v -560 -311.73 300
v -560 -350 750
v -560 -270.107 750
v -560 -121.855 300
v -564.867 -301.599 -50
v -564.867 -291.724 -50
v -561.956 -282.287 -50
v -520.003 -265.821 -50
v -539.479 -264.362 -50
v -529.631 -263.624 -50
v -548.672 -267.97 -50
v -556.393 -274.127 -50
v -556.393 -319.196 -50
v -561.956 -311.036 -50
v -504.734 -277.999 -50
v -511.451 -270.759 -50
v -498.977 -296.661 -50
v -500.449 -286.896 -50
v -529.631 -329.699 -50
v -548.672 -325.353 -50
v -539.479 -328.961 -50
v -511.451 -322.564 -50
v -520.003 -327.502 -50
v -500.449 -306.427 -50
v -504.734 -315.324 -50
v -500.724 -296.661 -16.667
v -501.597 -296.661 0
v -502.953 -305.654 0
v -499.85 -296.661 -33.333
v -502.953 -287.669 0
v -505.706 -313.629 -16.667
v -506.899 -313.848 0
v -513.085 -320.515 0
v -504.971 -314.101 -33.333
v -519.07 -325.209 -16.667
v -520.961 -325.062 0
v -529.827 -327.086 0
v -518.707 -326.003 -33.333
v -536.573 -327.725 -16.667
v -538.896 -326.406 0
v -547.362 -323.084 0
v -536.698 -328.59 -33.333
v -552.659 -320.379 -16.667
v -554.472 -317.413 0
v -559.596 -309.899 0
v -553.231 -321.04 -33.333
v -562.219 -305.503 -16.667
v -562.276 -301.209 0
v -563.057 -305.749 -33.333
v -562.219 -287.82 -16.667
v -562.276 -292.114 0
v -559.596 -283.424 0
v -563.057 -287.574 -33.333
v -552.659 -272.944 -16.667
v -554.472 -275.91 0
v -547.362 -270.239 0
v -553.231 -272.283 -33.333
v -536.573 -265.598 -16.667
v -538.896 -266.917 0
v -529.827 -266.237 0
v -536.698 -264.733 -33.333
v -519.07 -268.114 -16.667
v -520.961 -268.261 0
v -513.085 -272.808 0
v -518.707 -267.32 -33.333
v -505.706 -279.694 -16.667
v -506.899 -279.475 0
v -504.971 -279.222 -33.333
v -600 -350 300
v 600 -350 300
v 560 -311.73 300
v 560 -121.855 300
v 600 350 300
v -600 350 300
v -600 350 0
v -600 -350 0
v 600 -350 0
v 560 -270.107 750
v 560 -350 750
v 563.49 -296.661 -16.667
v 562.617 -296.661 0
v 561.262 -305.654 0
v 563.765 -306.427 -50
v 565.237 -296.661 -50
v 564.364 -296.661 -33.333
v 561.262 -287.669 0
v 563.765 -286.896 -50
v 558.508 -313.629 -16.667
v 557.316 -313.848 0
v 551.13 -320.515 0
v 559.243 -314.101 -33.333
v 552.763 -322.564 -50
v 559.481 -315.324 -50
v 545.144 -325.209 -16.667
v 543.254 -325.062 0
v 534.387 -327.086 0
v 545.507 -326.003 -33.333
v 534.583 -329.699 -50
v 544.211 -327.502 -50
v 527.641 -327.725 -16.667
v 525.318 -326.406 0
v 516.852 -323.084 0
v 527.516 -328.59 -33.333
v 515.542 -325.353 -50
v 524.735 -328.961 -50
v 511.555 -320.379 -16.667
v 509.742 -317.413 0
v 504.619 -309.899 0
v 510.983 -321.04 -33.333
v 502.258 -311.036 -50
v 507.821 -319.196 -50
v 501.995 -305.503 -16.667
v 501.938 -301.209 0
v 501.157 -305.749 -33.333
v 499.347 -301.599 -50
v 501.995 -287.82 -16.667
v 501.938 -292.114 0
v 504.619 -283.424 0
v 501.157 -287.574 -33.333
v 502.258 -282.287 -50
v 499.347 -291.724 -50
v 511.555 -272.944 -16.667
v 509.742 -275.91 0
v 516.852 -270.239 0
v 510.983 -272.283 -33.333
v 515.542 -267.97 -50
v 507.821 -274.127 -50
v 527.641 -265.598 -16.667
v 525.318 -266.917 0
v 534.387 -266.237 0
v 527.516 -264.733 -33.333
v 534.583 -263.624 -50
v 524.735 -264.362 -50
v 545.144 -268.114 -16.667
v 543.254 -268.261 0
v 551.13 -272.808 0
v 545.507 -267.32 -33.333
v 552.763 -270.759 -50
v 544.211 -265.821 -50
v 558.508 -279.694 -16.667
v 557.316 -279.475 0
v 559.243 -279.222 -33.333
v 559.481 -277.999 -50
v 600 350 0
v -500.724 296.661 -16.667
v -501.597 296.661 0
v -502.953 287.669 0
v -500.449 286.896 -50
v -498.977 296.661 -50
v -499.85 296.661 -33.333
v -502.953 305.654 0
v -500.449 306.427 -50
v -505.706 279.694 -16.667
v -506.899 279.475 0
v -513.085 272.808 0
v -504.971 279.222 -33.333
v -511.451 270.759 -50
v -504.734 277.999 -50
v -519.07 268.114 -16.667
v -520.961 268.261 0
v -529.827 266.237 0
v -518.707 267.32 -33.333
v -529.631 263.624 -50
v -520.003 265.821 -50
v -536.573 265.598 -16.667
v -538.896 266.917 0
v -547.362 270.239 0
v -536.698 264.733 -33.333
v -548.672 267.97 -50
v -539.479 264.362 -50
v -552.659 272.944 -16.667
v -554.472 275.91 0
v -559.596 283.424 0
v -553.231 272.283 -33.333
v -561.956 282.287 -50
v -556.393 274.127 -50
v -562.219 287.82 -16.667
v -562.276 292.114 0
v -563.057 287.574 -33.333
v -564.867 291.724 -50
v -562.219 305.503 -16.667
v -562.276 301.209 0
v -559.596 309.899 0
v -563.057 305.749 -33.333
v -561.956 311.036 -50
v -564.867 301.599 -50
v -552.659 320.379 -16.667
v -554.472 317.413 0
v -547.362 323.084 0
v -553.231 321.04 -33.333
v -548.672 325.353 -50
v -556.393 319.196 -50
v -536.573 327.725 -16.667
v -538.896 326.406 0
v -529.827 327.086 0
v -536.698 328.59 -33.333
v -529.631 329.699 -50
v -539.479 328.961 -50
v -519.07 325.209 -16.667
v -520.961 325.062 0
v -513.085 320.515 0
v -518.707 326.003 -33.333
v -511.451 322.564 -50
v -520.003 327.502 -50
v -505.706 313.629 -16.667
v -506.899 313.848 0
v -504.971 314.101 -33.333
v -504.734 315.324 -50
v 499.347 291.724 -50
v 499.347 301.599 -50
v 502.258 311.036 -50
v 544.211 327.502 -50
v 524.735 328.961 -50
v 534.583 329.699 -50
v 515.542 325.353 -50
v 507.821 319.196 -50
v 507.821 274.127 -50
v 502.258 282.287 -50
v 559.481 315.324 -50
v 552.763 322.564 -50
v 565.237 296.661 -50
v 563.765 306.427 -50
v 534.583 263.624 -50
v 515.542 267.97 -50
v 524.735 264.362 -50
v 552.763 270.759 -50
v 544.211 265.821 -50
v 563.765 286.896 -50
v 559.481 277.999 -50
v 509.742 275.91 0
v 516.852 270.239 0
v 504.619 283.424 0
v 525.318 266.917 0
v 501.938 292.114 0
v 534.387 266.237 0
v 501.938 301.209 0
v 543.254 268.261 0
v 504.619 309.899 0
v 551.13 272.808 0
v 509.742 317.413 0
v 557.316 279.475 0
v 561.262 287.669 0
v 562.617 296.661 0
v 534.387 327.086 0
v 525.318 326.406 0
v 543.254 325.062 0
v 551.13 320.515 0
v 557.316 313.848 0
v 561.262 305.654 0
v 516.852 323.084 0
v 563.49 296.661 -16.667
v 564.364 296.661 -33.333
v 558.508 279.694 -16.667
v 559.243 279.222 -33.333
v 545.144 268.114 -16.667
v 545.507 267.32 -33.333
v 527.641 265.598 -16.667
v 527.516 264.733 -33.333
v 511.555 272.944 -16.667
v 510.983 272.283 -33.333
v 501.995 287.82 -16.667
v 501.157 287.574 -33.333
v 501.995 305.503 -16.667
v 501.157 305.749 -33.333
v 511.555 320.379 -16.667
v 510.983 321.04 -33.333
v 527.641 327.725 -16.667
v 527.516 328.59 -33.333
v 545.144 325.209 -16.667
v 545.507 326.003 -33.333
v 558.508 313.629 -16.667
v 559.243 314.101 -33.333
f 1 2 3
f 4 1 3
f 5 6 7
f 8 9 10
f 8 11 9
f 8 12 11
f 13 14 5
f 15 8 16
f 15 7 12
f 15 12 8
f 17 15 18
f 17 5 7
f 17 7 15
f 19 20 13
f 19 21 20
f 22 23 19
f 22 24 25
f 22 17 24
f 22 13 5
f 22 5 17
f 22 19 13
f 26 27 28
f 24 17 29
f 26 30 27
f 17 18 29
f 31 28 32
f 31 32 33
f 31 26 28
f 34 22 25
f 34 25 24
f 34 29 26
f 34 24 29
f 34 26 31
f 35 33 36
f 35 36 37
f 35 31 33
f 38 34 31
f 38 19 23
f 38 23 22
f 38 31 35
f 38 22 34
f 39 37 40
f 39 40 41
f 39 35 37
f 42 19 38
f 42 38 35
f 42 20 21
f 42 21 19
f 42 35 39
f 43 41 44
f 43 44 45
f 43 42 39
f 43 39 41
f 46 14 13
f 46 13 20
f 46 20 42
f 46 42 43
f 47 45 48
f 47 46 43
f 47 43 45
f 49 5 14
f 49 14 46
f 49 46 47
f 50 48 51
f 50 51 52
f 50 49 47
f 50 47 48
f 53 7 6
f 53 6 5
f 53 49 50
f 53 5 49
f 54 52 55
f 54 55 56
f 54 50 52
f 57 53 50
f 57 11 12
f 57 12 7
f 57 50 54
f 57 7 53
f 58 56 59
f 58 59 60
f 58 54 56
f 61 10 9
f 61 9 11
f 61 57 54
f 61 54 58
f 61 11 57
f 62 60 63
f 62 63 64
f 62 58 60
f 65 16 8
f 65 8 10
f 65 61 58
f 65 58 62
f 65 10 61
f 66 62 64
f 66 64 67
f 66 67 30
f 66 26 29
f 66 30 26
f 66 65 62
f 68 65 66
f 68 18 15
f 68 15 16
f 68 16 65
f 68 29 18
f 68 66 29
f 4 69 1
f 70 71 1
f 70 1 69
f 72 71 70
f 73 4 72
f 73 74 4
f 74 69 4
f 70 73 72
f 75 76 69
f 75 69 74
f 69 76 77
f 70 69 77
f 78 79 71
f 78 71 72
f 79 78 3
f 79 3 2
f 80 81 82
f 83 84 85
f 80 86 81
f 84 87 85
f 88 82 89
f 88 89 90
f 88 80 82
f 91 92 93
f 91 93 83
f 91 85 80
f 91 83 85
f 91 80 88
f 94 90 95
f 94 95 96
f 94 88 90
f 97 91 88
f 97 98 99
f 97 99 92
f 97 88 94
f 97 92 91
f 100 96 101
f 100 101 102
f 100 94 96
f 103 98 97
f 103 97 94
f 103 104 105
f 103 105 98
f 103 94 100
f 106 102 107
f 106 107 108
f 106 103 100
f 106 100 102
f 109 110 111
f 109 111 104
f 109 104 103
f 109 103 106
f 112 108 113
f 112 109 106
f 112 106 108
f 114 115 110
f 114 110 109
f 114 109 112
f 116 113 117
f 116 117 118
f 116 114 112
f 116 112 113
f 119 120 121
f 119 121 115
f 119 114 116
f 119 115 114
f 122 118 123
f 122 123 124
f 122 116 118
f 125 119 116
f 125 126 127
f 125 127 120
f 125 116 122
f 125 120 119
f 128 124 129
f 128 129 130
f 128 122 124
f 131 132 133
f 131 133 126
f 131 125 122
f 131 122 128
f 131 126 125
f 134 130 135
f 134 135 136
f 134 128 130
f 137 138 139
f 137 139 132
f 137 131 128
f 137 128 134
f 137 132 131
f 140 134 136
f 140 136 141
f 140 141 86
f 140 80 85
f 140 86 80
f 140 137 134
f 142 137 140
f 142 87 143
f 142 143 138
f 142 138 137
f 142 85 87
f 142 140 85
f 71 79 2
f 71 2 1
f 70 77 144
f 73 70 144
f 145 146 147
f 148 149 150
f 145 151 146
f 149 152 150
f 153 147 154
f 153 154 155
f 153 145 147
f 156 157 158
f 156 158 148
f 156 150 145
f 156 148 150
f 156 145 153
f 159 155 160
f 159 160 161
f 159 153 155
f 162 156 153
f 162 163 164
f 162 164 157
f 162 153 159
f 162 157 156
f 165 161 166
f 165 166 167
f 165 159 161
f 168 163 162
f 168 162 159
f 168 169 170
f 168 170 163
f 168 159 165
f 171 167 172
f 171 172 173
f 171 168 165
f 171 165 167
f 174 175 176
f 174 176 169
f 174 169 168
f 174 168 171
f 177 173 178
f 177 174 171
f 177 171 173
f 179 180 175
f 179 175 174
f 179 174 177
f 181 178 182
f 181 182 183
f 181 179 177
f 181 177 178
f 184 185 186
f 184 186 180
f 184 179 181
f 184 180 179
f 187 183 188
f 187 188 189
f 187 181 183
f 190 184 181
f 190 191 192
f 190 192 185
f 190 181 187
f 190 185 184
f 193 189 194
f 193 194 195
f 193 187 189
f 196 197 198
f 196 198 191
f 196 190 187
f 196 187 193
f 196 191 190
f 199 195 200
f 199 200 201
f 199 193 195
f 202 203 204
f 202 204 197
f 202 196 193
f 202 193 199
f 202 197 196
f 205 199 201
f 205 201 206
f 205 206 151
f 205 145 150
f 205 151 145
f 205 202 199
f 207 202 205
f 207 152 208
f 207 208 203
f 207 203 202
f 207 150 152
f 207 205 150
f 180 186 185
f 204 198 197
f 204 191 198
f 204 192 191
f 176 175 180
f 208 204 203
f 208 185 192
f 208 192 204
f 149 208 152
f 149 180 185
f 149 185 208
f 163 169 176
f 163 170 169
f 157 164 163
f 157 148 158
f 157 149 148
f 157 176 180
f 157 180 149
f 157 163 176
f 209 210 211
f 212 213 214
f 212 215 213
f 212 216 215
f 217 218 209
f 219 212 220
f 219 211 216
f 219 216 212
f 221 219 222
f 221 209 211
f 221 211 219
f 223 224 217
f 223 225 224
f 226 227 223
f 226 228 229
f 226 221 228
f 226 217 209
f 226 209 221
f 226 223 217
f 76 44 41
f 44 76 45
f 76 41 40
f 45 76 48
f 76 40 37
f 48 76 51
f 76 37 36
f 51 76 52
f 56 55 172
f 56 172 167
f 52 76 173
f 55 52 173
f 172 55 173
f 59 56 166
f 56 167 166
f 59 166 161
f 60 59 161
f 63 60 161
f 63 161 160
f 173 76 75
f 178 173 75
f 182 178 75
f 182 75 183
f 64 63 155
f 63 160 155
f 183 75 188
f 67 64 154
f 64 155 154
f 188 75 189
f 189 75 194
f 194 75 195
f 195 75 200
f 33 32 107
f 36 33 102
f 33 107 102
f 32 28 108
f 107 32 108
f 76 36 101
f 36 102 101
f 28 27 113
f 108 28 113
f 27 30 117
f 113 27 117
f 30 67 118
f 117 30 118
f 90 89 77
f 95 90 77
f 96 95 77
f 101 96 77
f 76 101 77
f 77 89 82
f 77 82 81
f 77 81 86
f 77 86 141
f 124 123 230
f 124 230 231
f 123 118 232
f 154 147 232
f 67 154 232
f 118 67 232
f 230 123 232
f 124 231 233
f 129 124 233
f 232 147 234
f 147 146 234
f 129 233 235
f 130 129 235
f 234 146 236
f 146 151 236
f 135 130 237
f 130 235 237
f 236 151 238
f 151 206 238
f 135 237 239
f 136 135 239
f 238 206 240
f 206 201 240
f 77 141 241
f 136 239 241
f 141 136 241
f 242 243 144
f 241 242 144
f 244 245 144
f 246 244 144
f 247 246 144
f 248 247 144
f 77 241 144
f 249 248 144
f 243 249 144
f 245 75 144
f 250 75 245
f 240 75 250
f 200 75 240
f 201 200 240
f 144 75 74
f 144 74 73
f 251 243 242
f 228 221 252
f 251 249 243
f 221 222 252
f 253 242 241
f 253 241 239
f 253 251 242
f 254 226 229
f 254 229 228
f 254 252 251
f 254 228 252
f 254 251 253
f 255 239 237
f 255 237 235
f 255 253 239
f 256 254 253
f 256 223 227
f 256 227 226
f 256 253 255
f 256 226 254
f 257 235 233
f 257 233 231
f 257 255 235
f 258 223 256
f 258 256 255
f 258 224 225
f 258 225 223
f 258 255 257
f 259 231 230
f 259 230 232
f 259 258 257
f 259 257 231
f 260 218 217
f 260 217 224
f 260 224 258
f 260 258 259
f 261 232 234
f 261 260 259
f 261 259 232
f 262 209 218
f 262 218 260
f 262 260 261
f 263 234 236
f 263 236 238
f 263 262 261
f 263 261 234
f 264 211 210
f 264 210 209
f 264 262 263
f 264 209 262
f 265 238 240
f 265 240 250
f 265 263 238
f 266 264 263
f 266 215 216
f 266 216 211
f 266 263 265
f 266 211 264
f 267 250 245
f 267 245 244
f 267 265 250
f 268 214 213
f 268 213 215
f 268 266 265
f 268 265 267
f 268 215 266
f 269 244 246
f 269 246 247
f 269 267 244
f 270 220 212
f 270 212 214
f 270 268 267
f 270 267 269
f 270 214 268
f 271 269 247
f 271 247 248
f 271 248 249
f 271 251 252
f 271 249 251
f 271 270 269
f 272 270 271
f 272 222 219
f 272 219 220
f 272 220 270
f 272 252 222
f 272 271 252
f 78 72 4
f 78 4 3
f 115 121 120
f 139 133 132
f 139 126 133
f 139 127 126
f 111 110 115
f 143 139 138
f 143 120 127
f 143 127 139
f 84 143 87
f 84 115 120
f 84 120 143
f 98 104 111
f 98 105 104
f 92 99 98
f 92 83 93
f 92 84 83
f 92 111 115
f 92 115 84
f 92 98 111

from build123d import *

# Parameters (mm, degrees)
F0_W     = 1200
F0_H     = 700
F1_DEPTH = 300
F2_R     = 30.5098573856
F3_DEPTH = 50
F3_TAPER = -3
F5_DEPTH = 560


with BuildPart() as f1:
    # F0 (on Top) → F1 (new body)
    with BuildSketch(Plane.XY):
        Rectangle(F0_W, F0_H)
    extrude(amount=F1_DEPTH)

    # F2 (on face) → F3 (join)
    with BuildSketch(Plane(origin=(0, 0, 0), x_dir=(1, 0, 0), z_dir=(0, 0, -1))):
        with Locations((-532.1071147919, -296.6614961624)):
            Circle(F2_R)
        with Locations((532.1071147919, -296.6614961624)):
            Circle(F2_R)
        with Locations((532.1071147919, 296.6614961624)):
            Circle(F2_R)
        with Locations((-532.1071147919, 296.6614961624)):
            Circle(F2_R)
    extrude(amount=F3_DEPTH, taper=F3_TAPER)

    # F4 (on Right) → F5 (join, symmetric)
    with BuildSketch(Plane.YZ):
        Polygon((-305.8277244632, 230.5950983165), (-107.0006990349, 254.912089853), (-270.1073586941, 750), (-350, 750), align=None)
    extrude(amount=F5_DEPTH, both=True)


solid = f1.part
